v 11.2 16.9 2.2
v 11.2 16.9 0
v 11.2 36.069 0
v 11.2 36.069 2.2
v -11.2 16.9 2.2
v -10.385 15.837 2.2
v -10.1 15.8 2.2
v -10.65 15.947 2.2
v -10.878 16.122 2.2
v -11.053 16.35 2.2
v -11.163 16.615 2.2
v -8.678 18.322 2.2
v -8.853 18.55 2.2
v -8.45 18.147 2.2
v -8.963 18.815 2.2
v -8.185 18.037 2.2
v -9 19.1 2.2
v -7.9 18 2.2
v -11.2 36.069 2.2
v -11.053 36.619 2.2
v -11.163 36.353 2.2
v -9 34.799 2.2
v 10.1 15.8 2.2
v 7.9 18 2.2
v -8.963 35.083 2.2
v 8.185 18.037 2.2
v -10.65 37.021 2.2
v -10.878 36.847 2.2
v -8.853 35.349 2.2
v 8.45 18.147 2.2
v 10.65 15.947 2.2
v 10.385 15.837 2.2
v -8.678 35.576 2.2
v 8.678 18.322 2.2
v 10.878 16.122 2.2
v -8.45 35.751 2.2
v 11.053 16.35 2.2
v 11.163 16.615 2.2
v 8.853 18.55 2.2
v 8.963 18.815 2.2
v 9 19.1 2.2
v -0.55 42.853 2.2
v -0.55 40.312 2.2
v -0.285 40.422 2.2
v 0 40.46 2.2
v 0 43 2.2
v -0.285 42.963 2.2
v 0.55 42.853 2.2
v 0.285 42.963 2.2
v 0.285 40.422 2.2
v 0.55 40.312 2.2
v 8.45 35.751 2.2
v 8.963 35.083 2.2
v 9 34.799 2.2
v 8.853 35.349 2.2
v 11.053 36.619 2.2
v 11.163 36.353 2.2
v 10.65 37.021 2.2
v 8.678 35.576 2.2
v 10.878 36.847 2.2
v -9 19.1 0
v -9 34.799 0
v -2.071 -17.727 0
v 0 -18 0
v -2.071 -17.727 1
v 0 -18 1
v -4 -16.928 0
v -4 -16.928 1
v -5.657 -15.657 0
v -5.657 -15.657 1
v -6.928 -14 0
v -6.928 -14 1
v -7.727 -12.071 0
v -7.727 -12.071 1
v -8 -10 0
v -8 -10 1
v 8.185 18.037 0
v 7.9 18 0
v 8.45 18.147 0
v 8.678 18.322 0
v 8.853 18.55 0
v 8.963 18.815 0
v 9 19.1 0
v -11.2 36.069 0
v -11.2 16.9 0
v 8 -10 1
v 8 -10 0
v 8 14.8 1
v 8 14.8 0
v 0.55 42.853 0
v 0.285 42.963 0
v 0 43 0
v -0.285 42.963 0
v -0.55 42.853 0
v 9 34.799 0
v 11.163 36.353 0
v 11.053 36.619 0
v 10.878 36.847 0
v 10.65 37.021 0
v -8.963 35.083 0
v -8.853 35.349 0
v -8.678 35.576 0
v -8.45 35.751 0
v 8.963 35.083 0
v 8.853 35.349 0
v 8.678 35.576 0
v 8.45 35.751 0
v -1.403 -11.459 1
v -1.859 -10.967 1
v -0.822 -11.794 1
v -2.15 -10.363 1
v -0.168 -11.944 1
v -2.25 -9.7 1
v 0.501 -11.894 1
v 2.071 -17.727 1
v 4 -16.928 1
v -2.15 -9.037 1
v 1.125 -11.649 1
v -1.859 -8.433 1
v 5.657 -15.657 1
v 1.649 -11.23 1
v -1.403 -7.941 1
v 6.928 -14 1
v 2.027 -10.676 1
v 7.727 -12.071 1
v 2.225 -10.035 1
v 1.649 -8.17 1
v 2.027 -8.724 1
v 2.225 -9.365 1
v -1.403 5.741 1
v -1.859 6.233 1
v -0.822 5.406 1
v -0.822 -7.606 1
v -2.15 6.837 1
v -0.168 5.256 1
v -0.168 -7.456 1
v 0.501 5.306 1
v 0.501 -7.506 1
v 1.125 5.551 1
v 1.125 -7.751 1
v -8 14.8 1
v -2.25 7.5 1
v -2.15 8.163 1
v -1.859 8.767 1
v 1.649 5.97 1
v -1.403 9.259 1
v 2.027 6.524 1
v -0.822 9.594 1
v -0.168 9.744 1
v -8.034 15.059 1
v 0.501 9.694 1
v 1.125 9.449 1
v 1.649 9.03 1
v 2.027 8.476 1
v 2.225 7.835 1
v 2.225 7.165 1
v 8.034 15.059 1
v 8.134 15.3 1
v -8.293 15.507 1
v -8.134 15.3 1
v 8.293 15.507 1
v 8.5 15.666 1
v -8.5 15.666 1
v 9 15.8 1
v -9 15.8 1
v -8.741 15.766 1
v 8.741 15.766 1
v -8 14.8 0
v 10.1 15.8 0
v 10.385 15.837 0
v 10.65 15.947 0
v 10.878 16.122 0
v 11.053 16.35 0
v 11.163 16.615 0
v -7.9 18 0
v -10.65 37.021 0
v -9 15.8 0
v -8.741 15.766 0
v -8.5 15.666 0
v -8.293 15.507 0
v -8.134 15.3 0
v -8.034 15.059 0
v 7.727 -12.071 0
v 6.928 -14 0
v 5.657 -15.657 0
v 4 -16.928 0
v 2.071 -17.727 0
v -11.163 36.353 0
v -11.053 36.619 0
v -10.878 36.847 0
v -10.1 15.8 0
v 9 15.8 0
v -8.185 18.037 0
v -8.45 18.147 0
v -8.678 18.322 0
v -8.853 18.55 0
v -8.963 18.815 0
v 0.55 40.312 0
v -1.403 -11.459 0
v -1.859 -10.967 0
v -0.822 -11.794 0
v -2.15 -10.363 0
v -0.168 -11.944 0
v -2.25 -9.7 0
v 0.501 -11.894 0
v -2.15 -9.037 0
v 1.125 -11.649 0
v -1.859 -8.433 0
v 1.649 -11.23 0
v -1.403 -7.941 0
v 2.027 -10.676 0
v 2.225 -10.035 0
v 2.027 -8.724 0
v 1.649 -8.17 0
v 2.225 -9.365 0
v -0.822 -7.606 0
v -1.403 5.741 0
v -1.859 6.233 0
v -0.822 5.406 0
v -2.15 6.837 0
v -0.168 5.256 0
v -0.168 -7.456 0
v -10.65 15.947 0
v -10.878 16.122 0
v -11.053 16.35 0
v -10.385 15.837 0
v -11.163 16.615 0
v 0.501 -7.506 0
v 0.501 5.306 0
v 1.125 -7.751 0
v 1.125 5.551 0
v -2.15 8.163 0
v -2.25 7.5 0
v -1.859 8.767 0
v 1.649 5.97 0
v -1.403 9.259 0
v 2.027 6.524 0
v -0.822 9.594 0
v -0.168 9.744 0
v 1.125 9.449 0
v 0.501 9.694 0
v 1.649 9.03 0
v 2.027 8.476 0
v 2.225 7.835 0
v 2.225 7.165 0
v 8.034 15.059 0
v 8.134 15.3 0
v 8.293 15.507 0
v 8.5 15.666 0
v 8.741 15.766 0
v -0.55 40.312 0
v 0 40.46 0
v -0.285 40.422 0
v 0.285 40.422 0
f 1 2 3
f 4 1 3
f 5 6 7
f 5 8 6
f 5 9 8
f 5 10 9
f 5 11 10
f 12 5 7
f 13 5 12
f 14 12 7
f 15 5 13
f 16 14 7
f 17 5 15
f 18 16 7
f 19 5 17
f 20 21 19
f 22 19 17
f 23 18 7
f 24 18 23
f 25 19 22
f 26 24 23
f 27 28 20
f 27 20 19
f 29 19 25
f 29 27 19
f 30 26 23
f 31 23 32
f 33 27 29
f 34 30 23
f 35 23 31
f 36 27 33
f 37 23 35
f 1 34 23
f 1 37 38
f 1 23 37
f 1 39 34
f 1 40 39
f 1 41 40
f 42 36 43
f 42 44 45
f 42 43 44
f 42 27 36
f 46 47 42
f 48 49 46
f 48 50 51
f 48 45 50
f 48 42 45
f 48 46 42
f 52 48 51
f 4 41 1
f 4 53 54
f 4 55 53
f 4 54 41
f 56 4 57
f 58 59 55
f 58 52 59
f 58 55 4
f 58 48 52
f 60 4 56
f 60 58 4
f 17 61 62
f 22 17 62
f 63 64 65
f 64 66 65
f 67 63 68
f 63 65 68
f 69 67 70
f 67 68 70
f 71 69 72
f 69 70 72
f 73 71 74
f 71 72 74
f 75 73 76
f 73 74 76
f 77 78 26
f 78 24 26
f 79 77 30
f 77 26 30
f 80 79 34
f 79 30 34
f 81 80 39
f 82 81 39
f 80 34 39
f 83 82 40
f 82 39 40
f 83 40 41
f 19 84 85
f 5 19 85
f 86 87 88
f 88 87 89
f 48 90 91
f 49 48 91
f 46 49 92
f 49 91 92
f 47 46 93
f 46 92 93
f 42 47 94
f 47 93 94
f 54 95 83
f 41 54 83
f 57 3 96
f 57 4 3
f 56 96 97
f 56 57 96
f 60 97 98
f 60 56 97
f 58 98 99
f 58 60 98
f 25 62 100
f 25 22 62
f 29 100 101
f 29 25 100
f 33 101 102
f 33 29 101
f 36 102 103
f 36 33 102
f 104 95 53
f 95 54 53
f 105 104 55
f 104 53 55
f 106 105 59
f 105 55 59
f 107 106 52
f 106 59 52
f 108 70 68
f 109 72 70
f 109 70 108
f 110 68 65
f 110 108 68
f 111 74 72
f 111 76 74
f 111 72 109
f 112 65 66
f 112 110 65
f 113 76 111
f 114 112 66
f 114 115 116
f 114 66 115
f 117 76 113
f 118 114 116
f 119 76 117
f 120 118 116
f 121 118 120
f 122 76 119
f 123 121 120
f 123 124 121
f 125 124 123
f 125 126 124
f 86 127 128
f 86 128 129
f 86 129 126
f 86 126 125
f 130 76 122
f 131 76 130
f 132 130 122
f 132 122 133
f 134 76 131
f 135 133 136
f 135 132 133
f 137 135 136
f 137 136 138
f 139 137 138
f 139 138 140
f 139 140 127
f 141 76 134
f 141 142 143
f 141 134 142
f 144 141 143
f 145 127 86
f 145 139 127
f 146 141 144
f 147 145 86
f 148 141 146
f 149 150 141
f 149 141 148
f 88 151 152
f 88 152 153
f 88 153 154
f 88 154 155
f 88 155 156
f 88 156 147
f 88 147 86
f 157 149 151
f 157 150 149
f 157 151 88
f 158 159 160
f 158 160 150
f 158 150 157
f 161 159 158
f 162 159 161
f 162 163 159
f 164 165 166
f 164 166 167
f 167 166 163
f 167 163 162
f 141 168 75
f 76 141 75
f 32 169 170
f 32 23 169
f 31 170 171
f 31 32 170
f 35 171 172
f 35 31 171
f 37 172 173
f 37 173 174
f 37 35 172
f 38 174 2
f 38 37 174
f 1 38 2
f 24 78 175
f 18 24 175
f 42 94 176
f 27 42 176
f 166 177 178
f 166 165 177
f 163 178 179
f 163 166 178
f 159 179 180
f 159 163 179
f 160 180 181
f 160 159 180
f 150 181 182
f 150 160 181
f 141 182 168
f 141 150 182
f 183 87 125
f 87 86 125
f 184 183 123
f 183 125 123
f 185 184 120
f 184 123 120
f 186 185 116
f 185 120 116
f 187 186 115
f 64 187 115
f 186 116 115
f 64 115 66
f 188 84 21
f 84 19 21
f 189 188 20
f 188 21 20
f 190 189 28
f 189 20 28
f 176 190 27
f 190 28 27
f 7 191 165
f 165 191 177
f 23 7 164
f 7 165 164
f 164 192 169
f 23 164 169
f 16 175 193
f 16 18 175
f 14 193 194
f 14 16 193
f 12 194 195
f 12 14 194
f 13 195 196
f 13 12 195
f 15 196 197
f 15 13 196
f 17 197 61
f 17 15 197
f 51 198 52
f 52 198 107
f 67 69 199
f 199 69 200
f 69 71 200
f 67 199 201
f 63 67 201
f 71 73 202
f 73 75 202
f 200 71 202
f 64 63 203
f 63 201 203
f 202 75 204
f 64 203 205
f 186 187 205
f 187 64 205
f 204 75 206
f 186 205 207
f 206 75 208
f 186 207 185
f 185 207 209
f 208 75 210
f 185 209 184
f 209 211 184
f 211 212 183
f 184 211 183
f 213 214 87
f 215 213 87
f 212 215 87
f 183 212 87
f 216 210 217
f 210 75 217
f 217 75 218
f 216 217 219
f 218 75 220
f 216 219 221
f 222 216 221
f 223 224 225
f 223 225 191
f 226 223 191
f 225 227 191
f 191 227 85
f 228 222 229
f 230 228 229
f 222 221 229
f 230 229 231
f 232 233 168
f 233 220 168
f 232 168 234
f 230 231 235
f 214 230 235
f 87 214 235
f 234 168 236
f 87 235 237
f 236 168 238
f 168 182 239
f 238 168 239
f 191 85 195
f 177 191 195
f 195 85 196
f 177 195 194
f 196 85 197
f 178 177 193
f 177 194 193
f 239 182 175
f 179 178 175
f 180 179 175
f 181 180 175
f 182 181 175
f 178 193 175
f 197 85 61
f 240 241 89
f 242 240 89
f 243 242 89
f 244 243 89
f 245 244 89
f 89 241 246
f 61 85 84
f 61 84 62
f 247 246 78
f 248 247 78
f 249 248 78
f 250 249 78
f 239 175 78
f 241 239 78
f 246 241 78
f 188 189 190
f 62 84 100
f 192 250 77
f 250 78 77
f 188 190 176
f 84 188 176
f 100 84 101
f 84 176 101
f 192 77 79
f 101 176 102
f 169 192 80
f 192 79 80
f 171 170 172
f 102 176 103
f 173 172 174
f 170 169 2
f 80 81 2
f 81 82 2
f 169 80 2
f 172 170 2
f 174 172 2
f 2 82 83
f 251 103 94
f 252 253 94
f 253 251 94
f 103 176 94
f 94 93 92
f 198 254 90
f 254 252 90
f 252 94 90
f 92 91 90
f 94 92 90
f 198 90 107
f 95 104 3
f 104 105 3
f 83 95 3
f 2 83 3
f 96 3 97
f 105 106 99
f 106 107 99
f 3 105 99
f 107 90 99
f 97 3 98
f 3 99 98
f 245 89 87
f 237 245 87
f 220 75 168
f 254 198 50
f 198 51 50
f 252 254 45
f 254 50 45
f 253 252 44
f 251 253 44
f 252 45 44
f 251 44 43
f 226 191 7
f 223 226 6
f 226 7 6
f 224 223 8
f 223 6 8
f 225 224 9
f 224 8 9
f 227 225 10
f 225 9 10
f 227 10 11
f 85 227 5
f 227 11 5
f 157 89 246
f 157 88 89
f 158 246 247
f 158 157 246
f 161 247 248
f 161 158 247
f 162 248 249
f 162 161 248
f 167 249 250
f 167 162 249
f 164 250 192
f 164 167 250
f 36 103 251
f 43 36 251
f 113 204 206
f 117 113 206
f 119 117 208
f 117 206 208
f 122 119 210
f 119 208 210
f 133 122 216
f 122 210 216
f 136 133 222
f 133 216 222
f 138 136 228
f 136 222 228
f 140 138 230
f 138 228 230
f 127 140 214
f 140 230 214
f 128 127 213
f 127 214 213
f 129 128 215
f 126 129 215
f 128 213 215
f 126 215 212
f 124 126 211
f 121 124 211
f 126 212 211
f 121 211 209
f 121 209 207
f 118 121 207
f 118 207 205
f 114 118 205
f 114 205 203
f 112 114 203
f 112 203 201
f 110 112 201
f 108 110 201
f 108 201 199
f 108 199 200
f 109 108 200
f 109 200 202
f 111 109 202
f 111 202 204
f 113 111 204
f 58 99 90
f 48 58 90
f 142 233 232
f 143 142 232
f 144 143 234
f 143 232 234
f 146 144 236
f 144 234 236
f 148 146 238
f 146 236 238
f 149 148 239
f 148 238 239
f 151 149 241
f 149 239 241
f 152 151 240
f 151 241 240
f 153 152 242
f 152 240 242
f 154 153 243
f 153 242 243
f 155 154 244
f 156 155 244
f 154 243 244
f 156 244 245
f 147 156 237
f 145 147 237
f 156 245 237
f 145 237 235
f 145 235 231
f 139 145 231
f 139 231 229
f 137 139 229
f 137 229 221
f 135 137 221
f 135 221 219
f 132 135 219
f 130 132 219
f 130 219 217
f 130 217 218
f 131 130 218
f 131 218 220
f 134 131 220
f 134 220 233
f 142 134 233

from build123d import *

# Parameters (mm, degrees)
EXTRUDE_1_DEPTH     = 2.2
SKETCH_4_W          = 16
SKETCH_4_H          = 33.8
CUT_EXTRUDE_1_DEPTH = 1.2
F_2_0MM_1_D         = 4.5
FILLET_1_R          = 1.1
FILLET_2_R          = 8
FILLET_3_R          = 1


with BuildPart() as part:
    # 草圖2 → 填料-伸長1 (new body)
    with BuildSketch(Plane.XY):
        with BuildLine():
            Line((8, -18), (8, 15.8))
            Line((8, 15.8), (11.2, 15.8))
            Line((11.2, 15.8), (11.2, 36.703847577))
            Line((11.2, 36.703847577), (0.55, 42.852627944))
            ThreePointArc((0.55, 42.852627944), (0, 43), (-0.55, 42.852627944))
            Line((-0.55, 42.852627944), (-11.2, 36.703847577))
            Line((-11.2, 36.703847577), (-11.2, 15.8))
            Line((-11.2, 15.8), (-8, 15.8))
            Line((-8, 15.8), (-8, -18))
            Line((-8, -18), (8, -18))
        make_face()
        Polygon((8, 18), (-8, 18), (-9, 18), (-9, 35.433676985), (0, 40.629829408), (9, 35.433676985), (9, 18), align=None, mode=Mode.SUBTRACT)
    extrude(amount=EXTRUDE_1_DEPTH)

    # 草圖4 → 除料-伸長1 (cut)
    with BuildSketch(Plane.XY.offset(2.2)):
        with Locations((0, -1.1)):
            Rectangle(SKETCH_4_W, SKETCH_4_H)
    extrude(amount=-CUT_EXTRUDE_1_DEPTH, mode=Mode.SUBTRACT)

    # Ø2.0mm 定位孔1 (through all)
    with Locations(Plane(origin=(0, 7.5, 1), x_dir=(1, 0, 0), z_dir=(0, 0, 1))):
        with Locations((0, 0), (0, -17.2)):
            Hole(F_2_0MM_1_D / 2)

    # 圓角1
    fillet_1_edges = [part.edges().sort_by_distance(p)[0] for p in [
        (9, 35.433676985, 1.1),
        (0, 40.629829408, 1.1),
        (-9, 35.433676985, 1.1),
        (-9, 18, 1.1),
        (9, 18, 1.1),
        (-11.2, 15.8, 1.1),
        (-11.2, 36.703847577, 1.1),
        (11.2, 36.703847577, 1.1),
        (11.2, 15.8, 1.1),
    ]]
    fillet(fillet_1_edges, radius=FILLET_1_R)

    # 圓角2
    fillet_2_edges = [part.edges().sort_by_distance(p)[0] for p in [
        (8, -18, 0.5),
        (-8, -18, 0.5),
    ]]
    fillet(fillet_2_edges, radius=FILLET_2_R - 0.0001)  # a hair under: the kernel refuses the full size

    # 圓角3
    fillet_3_edges = [part.edges().sort_by_distance(p)[0] for p in [
        (-8, 15.8, 0.5),
        (8, 15.8, 0.5),
    ]]
    fillet(fillet_3_edges, radius=FILLET_3_R)


solid = part.part
